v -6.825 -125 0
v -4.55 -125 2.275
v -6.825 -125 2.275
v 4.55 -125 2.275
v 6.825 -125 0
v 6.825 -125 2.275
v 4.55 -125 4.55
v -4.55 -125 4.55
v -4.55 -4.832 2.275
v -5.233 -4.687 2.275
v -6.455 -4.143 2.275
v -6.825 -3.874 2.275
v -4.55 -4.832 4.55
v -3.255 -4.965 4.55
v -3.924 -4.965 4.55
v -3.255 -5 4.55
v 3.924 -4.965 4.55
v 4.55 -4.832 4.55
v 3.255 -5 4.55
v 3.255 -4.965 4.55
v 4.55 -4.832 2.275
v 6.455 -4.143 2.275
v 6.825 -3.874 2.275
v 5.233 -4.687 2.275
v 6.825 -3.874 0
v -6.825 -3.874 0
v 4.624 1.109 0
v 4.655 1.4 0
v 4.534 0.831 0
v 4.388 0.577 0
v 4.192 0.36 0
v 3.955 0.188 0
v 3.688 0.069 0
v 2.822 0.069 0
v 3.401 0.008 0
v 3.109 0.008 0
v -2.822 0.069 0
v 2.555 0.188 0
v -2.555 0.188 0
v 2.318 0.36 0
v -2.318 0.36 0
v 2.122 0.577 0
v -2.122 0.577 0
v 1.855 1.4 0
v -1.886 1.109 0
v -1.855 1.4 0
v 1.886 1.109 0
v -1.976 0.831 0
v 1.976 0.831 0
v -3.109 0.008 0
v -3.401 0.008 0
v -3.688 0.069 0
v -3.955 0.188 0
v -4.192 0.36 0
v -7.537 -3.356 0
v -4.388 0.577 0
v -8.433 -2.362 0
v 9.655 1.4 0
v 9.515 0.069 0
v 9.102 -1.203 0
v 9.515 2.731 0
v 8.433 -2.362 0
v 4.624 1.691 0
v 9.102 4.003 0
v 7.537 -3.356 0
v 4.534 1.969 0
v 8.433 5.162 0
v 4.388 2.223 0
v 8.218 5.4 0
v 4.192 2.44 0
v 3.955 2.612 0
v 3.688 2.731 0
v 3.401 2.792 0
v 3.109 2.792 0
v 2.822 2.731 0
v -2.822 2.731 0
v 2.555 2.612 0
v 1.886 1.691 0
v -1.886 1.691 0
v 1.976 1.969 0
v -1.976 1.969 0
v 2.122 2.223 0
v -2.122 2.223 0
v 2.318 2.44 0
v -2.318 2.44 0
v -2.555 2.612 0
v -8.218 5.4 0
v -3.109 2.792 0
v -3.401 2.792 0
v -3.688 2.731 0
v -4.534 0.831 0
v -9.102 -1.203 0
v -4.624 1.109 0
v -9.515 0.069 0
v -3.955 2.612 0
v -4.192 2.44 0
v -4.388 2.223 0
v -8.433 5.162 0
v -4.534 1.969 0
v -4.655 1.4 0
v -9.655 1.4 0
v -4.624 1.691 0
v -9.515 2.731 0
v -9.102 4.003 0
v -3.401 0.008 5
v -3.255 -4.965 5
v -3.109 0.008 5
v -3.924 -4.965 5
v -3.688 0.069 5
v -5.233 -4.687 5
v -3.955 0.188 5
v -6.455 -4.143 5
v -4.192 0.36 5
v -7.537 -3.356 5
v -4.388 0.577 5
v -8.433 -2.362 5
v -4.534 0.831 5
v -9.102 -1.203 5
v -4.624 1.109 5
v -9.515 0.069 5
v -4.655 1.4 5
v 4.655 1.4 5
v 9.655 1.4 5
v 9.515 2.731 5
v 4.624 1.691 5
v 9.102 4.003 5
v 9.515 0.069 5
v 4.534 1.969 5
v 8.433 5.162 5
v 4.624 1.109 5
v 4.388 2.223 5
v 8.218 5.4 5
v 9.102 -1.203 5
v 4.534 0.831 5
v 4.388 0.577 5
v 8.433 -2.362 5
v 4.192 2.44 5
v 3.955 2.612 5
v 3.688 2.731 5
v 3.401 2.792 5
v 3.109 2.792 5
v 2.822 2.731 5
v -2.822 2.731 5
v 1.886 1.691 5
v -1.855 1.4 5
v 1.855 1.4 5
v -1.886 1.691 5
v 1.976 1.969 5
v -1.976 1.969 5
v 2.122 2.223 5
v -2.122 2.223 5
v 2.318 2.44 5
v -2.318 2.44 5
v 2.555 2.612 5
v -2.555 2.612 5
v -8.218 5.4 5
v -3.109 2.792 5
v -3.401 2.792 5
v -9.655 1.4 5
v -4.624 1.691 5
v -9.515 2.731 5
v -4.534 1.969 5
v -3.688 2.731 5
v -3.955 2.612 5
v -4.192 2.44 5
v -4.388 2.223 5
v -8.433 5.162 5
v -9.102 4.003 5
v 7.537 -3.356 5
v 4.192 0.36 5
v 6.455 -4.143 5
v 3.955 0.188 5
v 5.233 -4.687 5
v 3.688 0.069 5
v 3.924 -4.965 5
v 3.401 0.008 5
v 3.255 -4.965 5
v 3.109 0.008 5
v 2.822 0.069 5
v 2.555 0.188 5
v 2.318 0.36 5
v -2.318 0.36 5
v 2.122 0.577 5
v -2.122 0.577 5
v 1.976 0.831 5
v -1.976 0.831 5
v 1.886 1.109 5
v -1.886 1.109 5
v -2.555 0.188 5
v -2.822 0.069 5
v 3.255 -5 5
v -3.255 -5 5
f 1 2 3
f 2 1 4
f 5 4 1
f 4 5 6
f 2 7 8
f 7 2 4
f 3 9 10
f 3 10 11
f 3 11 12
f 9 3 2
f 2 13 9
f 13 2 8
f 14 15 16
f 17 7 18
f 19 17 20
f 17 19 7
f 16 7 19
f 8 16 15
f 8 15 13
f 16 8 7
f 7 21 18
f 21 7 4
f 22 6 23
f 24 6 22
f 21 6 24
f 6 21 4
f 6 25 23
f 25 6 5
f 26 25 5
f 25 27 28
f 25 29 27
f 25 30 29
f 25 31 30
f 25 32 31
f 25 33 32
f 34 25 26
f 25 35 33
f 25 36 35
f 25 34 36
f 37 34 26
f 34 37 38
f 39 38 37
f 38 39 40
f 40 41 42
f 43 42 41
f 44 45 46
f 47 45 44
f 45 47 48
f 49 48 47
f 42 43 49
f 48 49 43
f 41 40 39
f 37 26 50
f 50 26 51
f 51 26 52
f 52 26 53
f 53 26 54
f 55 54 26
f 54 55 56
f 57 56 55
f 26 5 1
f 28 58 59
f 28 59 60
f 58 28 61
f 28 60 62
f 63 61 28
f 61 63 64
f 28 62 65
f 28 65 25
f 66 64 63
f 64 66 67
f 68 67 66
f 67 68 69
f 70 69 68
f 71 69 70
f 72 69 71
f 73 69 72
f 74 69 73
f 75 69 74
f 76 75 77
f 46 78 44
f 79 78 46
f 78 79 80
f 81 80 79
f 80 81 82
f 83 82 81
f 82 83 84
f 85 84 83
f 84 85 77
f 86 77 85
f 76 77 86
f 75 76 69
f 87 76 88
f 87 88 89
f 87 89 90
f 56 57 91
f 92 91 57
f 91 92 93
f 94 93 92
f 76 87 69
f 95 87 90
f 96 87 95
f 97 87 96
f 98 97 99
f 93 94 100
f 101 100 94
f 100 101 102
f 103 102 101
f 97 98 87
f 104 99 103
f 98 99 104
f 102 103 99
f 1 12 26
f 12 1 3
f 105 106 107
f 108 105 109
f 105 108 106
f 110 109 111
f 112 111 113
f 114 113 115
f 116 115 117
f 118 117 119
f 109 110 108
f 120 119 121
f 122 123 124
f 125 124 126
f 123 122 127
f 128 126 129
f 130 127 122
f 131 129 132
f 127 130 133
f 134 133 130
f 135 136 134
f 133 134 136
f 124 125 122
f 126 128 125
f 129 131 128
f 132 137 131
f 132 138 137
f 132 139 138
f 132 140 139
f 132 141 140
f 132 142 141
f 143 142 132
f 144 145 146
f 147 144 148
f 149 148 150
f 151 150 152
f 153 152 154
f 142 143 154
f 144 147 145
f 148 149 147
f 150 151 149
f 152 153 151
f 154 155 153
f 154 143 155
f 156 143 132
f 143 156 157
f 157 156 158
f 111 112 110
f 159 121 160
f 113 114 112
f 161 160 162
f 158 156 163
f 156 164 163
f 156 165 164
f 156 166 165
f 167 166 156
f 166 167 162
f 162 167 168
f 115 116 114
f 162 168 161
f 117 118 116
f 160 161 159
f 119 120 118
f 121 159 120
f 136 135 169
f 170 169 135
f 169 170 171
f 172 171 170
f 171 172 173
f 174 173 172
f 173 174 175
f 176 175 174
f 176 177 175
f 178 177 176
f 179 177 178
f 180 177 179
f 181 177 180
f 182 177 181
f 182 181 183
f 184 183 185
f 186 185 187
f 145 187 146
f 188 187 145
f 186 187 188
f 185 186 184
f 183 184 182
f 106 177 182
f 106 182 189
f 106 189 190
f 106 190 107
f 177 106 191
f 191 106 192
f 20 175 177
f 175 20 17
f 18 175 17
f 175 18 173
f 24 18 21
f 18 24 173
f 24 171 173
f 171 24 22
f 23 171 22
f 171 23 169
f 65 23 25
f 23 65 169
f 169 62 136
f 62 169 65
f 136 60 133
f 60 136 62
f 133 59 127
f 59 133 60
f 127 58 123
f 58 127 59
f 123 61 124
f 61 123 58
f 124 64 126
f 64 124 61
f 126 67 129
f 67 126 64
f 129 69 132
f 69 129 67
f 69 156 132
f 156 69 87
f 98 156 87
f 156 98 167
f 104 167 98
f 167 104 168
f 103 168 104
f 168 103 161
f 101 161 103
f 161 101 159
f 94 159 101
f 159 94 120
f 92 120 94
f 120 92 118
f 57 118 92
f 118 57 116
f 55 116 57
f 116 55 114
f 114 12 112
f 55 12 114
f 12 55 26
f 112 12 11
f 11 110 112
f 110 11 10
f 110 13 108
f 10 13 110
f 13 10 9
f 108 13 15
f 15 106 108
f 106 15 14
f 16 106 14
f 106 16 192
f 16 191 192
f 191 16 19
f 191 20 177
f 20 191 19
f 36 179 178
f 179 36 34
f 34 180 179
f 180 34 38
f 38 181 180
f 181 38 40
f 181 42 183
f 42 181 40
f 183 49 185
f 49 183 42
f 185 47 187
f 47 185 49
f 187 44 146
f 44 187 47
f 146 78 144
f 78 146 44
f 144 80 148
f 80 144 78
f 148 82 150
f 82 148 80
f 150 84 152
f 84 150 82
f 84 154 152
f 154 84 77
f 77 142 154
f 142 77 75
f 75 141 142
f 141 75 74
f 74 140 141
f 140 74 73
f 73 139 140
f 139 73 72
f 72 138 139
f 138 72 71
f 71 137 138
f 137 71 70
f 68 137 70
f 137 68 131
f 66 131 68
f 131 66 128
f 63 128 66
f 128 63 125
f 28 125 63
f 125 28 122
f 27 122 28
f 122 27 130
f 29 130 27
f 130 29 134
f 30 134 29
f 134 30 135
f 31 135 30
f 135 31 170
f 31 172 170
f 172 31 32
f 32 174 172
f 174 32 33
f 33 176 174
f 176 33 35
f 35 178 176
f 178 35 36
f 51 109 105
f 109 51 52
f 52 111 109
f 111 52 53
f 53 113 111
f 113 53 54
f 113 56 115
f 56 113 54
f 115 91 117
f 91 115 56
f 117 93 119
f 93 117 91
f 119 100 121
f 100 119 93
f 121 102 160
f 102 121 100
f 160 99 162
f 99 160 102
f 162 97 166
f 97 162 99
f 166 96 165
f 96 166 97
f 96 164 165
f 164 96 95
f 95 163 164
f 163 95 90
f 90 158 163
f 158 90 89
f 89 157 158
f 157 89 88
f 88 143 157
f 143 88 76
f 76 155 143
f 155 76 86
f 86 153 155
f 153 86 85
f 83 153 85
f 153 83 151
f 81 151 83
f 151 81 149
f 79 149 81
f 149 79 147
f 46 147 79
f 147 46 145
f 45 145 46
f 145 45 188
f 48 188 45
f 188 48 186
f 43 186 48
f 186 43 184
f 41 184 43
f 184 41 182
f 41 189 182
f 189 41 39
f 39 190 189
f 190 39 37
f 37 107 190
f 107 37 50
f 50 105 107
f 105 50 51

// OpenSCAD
//
//  Copyright (C) 05-05-2013 Jasper den Ouden.
//
//  This is free software: you can redistribute it and/or modify
//  it under the terms of the GNU General Public License as published
//  by the Free Software Foundation, either version 3 of the License, or
//  (at your option) any later version.
//

$fs=0.1;

t=5;

rr = 8.8/2; //Z-rod radius.
rb = 10; //Horizontal rod radius.
nw = 13.1; // Nut width

dx = 20; //11.1 //Horizonal rod distance
d = 11.1;//rr+rb+2*t;//Distance between rods. TODO
dz=15; //Vertical distance.

feature = false; //NOTE kindah broken for true.
al=5; 
sr=1.4;    //Screw radius.
snw = 6.2; //Screw hex head width.
snh= 4;    //Actually bunch more than the hex head height.

pair_enough=false; //Wether to just have two or as many as wanted half-feature holes.

zt = 1.5*t; //Height of z-rod assocated
xl = 4*al; //Length of nut profile.

hex_from_top=true;
with_slide=true;

inf = 3*(rr+rb+nw);

module z_rod_associated()
{
    hx = dx+2.5*t; 
    x = rr+t+al+t;
    difference()
    {   union()
        {   circle(rr+t); //Round smooth rod.
            translate([0,x]) circle(rr/2+t); //Springy circle
            translate([0,x/2]) square([2*t,x],center=true); //And slot leading to it.

            translate([dx-al,d]) circle(al+t); //Feature hold plate.
            if(feature) translate([dx+x,d]) circle(al+t);
            if(feature)
            {   translate([dx+x/2-al,d]) square([2*(x-al),2*(al+t)],center=true); }
            else
            {   translate([xl/2+dx/2,d]) square([xl+dx,2*(al+t)],center=true);
            }
        }
        translate([0,x]) circle(rr/2); //hole in springy

        for( x = [dx-t : 3*al : dx+al+5*t] ) translate([x,d]) circle(al);  //Feature holes.
        circle(rr); //Hole for smooth rod.
        square([rr/2,2*x], center=true); //Slot for clicking on.
        translate([0,-rr-t]) scale([1/2,1]) rotate(45) //Easier opening.
            square(2*[t,t],center=true); 
    }
}

module screws_plate()
{   hl= 2*rb+t+3*sr; //Plate for screws.
    difference()
    {   union()
        {   translate([0,hl/4]) square([3*sr+t,hl/2],center=true);
            translate([0,+hl/2]) circle(3*sr/2+t/2);
        }
        square(2*[al,al],center=true);
        translate([0,+hl/2]) circle(sr);
    }
}

module slide_profile()
{
    translate([0,al/2]) square(al*[2,1],center=true);
    translate([0,3*al/4]) square(al*[3,1/2],center=true);
}

bw=2*(al+t);//3*(rb+t)/2;
//Slide-on and clamp.
module _bottom()
{
    w=bw;
    tz = dz+3*t;
    translate([dx,d]) rotate([0,90,0]) linear_extrude(height=xl) difference()
    {   union()
        {   circle(nw/2+t);
            translate([-dz/2,0]) square([dz,w], center=true);
        }
        if( hex_from_top ) translate([nw/2+inf,0]) square(inf*[2,2],center=true);
    }
    hx = dx+2.5*t; 
    if(feature)translate([dx+2*al,d,tz-zt-t]) linear_extrude(height=t) screws_plate();
    
    translate([0,0,dz]) linear_extrude(height=zt) z_rod_associated();
}

module hex_hole(w)
{
    difference()//Where it goes on the big nuts.
    {   circle(w); //Hex thing
        for( a= [0:60:360] ) rotate(a) translate([w,0]) square([w,w],center=true);
    }
}

module bottom()
{
    bh = dz+zt+nw/2;
    difference()
    {   union()
        {   _bottom();
            translate([0,bw]) scale([1,-1]) if( with_slide ) //Block it slides in.
            {   translate([dx+xl/2,-0.2*al,-nw/2]) linear_extrude(height=bh)
                {   square([xl-al,2*al],center=true);
                    square([xl,al],center=true);
                    for( s=[1,-1] ) translate([s*(xl-al)/2,-al/2]) circle(al/2);
                }
                //More where the screw to clamp it down goes.
                translate([dx+xl/2,-al,dz]) cylinder(r=1.5*al,h=3*al/2);
            }
                        
        }        
        //hex nut space and screw space.
        translate([0,bw]) scale([1,-1]) 
            if( with_slide ) translate([dx+xl/2,0,dz+3*al/4]) rotate([90,0]) 
        {   cylinder(r=sr,h=inf);
            linear_extrude(height=al+snh) hex_hole(snw); //Small hex nut.
        }

        translate([0,bw]) scale([1,-1]) if( with_slide ) //Slide hole.
            translate([dx+xl/2,-al/2,-nw/2]) linear_extrude(height=3*bh)
                translate([0,-al/2]) slide_profile();
        
        translate([dx,d]) rotate([0,90,0]) linear_extrude(height=inf) 
        {   hex_hole(nw); //Where it goes on the big nuts.
            if( pair_enough ) //Half feature holes.
            {   for( y=[-al,al] ) translate([al-dz,y])  circle(al/2); }
            else
            {   for( z=[al:2*al:dz-nw/2] )
                    for( y=[-al,al] ) translate([z-dz,y])  circle(al/2);
            }
        }
    }
}

module bottom_as_print()
{   rotate([0,180,0]) bottom(); }

//Slider with small endstop.
//I had ZMA00A080P00PC's 
//http://nl.mouser.com/ProductDetail/CK-Components/ZMA00A080P00PC/?qs=sGAEpiMZZMumBvQ1hY%2ffBUTjWSsepfwlGeSSynpM5b4%3d
sd = 6.51;//Distance between screws. 
sdy = 4; //Height of microswitch from screws.(button has to stick out)

sl = 120; //Slider length.

module _slider_with_endstop()
{
    f= 0.91;
    bh = dz+zt+nw/2;
    rotate([90,0]) translate([0,-f*al]) linear_extrude(height=sl+t) scale(f) slide_profile();
    
    w= 2*(sr+t);
    translate([0,sr,-t]) linear_extrude(height=t) difference()
    {   union()
        {   square([sd, w],center=true);
            for(s = [1,-1] ) scale([s,1]) translate([sd/2,0]) circle(sr+t);
        }
        for(s = [1,-1] ) scale([s,1]) translate([sd/2,0]) circle(sr);
        translate([0,sdy+2*inf]) square(inf*[4,4],center=true);
    }
}
module slider_with_endstop()
{   scale([1,1,-1]) _slider_with_endstop(); 
}

fr = 1.75/2; //Filament radius.
tt=3;

//Thumb wheel for it.
module thumb_wheel()
{
    t=tt;
    h=2.4*snh+2*t;
    difference()
    {   union()
        {   cylinder(r=snw/2+t, h=h);
            for( a=[0:60:360] ) rotate(a) translate([snw/2+t/2,0]) 
                                {   cylinder(r=t, h=h-t);
                                    translate([0,0,h-t]) sphere(t);
                                }
        }
        translate([0,0,t]) 
        {   linear_extrude(height=snh) hex_hole(snw);
            cylinder(r=snw/2, h=2.4*snh);
        }
        cylinder(r=sr,h=2.4*snh);
        //Hole to slide it in.
        translate([0,inf/2])
        {   cube([2*sr,inf,2*(2.4*snh+t)],center=true);
            translate([0,0,t+1.2*snh]) cube([snw,inf,2.4*snh],center=true);
        }
        translate([-inf,snw/2,1.2*snh+t]) rotate([0,90,0]) cylinder(r=fr,h=3*inf);
    }
}

//bottom_as_print();
slider_with_endstop();
//thumb_wheel();
